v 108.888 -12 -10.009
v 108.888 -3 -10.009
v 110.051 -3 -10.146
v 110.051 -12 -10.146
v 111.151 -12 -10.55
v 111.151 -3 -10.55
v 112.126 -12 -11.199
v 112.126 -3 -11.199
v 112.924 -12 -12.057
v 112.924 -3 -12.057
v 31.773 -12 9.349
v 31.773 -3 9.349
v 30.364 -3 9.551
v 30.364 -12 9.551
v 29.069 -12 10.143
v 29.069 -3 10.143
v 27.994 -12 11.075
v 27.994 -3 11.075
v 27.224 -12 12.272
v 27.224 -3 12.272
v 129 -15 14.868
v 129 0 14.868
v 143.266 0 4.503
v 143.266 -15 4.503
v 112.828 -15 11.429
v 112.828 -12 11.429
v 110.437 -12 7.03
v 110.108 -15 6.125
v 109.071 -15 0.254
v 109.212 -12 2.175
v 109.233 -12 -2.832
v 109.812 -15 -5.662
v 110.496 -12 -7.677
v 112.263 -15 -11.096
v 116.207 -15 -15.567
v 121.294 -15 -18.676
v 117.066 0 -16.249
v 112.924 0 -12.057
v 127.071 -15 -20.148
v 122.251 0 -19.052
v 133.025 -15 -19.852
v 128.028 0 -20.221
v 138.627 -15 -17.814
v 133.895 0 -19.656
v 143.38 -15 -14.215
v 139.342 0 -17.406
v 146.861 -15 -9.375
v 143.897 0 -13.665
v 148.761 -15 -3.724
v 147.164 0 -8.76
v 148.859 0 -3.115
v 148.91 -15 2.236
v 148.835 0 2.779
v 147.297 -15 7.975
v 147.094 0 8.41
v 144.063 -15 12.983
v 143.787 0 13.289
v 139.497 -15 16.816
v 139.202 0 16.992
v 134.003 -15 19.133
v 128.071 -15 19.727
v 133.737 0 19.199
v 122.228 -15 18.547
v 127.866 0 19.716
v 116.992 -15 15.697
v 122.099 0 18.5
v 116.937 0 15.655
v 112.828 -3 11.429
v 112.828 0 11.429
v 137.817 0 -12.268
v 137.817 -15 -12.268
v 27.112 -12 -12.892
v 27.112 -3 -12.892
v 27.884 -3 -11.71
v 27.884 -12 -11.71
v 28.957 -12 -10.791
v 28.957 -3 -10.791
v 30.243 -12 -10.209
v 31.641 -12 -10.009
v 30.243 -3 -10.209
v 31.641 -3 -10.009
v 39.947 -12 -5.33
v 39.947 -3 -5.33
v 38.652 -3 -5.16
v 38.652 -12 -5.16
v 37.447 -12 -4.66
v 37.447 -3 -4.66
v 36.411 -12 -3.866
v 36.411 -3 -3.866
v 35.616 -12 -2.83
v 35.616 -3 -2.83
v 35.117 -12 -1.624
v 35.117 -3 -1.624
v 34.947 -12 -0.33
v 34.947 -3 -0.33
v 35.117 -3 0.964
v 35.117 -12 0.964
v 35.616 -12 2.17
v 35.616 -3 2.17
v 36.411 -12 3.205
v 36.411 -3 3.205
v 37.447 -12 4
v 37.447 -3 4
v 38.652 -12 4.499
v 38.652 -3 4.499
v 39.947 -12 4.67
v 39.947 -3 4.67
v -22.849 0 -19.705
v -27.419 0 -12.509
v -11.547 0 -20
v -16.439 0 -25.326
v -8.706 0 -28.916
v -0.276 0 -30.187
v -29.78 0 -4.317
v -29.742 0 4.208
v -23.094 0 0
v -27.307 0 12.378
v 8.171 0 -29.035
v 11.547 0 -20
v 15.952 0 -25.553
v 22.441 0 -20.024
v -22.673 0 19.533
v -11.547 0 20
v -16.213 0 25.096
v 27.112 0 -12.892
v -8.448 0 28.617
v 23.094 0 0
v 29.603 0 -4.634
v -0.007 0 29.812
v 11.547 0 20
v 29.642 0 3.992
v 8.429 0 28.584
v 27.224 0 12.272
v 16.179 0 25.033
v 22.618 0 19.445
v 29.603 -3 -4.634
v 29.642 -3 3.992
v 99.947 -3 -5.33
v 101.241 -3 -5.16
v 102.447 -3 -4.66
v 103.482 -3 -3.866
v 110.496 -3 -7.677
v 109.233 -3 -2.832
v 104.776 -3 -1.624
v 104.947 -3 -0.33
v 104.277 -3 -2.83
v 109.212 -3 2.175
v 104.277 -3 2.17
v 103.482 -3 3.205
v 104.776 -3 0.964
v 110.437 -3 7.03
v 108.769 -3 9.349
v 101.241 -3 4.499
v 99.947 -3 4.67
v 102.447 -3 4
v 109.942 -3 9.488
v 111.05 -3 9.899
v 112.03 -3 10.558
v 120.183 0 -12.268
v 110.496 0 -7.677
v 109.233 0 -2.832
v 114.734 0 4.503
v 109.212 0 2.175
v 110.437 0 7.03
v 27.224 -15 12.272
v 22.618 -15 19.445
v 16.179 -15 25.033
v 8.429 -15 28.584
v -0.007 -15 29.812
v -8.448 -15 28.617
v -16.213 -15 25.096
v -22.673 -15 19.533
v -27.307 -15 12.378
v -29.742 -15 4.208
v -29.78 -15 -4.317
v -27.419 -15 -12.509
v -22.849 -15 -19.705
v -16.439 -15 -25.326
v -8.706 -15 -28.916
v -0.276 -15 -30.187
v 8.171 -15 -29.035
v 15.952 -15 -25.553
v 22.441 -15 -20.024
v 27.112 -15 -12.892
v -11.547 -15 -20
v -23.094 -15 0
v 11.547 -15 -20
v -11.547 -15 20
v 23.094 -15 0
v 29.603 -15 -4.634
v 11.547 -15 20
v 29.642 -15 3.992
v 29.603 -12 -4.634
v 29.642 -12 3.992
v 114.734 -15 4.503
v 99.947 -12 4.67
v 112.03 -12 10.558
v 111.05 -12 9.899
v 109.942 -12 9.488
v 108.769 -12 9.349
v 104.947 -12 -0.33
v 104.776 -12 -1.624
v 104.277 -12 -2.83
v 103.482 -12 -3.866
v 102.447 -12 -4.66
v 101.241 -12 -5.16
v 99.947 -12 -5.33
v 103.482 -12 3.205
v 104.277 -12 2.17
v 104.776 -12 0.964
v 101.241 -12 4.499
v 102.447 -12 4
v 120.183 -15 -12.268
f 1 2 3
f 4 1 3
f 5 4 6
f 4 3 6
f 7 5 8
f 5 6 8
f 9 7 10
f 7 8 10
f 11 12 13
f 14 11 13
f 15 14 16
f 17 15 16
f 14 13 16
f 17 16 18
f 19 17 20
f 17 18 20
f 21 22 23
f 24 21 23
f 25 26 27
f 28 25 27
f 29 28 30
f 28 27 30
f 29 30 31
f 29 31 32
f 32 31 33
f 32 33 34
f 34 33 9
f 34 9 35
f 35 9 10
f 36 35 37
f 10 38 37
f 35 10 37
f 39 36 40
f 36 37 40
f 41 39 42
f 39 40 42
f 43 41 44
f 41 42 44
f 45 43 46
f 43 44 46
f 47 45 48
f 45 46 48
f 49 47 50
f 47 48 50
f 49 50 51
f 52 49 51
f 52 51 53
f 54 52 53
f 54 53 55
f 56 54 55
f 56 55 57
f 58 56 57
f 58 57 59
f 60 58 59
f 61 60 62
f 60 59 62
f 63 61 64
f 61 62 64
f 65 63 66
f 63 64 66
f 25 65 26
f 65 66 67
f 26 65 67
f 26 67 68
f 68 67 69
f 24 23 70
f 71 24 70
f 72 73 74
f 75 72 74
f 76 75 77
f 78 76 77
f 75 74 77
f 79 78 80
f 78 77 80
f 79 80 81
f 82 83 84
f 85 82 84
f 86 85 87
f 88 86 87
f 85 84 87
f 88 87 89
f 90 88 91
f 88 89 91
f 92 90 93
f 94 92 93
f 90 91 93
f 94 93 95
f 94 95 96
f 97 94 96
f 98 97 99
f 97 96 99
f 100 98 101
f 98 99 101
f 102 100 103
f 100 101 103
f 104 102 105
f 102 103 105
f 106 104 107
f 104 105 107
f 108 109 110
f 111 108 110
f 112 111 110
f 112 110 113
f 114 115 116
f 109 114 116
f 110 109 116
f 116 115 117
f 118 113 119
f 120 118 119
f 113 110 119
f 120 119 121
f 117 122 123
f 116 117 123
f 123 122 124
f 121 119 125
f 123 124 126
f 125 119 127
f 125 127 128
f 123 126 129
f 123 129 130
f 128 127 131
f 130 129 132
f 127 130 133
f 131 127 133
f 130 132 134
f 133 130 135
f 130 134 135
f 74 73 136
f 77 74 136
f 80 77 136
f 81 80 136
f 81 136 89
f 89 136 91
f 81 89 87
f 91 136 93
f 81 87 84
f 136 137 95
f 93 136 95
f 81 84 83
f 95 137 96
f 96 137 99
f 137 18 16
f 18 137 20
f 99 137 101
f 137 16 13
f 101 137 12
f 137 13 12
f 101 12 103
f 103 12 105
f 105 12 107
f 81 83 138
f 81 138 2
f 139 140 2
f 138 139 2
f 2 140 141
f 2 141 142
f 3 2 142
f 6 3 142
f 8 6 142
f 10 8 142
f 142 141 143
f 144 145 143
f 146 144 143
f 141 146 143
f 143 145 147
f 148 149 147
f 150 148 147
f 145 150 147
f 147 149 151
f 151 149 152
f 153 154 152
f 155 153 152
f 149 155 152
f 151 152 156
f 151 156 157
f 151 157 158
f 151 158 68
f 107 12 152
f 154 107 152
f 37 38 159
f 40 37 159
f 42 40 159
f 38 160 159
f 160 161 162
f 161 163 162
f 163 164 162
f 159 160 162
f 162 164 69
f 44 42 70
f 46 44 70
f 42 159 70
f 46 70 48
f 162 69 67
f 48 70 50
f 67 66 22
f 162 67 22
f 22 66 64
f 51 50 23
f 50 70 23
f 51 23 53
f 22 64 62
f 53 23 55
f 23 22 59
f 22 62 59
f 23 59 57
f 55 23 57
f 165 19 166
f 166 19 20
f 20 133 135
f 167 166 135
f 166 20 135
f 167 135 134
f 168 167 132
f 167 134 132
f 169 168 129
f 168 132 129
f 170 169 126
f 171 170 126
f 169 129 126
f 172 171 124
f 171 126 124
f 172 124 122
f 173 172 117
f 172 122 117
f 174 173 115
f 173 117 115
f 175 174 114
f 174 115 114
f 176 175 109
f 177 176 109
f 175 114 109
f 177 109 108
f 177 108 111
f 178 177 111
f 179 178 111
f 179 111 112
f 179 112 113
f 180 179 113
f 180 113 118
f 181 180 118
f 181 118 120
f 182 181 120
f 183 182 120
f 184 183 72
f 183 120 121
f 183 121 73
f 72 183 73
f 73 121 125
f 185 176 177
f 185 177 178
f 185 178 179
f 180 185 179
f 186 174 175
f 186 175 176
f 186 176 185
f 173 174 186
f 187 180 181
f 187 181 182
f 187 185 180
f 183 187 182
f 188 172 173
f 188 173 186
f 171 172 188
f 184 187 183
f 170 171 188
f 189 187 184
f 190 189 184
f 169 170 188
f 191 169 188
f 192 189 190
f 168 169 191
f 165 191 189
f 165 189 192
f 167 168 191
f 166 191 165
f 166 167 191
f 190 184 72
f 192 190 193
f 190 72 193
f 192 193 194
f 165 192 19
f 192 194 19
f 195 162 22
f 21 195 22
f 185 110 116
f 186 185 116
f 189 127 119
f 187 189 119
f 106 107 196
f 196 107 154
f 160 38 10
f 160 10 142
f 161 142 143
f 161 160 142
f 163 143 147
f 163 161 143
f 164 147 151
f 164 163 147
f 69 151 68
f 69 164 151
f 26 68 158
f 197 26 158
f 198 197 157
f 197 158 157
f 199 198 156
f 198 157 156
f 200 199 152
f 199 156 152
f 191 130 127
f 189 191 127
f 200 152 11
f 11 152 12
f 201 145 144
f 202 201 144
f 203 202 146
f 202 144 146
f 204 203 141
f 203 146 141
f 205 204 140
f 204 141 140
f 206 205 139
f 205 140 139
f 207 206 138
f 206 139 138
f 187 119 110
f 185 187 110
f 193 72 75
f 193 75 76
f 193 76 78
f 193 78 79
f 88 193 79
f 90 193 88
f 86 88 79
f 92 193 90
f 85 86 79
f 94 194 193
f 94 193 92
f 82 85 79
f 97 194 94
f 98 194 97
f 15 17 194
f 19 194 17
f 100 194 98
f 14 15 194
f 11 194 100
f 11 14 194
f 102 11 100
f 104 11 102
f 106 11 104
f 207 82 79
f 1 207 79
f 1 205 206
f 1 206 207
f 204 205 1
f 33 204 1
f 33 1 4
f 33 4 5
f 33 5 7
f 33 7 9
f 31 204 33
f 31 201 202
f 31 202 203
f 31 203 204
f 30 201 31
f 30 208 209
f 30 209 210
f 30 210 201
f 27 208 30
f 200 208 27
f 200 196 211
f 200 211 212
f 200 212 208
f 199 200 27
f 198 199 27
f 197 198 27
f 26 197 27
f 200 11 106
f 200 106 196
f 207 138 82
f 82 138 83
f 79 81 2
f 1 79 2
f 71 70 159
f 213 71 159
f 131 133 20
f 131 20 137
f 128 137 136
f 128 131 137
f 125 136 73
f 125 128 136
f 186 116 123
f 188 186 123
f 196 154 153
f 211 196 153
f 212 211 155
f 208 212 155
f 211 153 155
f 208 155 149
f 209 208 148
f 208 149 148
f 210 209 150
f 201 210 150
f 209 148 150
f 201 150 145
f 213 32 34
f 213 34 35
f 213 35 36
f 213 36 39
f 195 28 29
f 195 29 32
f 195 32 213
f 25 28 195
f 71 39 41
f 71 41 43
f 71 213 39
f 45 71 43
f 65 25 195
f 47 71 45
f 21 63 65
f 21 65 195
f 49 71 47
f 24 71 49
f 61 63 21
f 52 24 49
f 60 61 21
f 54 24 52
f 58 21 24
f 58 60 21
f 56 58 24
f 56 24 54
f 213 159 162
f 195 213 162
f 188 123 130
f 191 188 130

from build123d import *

# Parameters (mm, degrees)
F1_DEPTH = 15
F2_DEPTH = 12
F3_DEPTH = 3


with BuildPart() as f1:
    # F0 (on Front) → F1 (new body)
    with BuildSketch(Plane.XZ):
        with BuildLine():
            ThreePointArc((27.111572217, -12.8918176383), (29.93394524, -0.3222598375), (27.2243880974, 12.2720989346))
            ThreePointArc((27.2243880974, 12.2720989346), (-30.0654517858, -0.0532681334), (27.111572217, -12.8918176383))
        make_face()
        Polygon((-11.5470053838, -20), (-23.0940107676, 0), (-11.5470053838, 20), (11.5470053838, 20), (23.0940107676, 0), (11.5470053838, -20), align=None, mode=Mode.SUBTRACT)
    extrude(amount=F1_DEPTH)



with BuildPart() as f1b:
    # F0 (on Front) → F1, piece 2 (new body)
    with BuildSketch(Plane.XZ):
        with BuildLine():
            ThreePointArc((112.9235786366, -12.0569396696), (149.0649853319, -0.1668697578), (112.8282363773, 11.4293824652))
            ThreePointArc((112.8282363773, 11.4293824652), (109.0653149154, -0.3292476273), (112.9235786366, -12.0569396696))
        make_face()
        Polygon((114.7340843825, 4.5029248509), (128.9999321269, 14.8676699353), (143.2657798714, 4.5029248509), (137.8167109113, -12.2675849804), (120.1831533425, -12.2675849804), align=None, mode=Mode.SUBTRACT)
    extrude(amount=F1_DEPTH)


with BuildPart() as f1_1:
    add(f1.part)

    add(f1b.part)  # F2 merges F1b
    # F0 (on Front) → F2 (join)
    with BuildSketch(Plane.XZ):
        with BuildLine():
            Line((108.7690079407, 9.3487427546), (31.7727449925, 9.3487427546))
            ThreePointArc((31.7727449925, 9.3487427546), (29.0693414988, 10.1426032479), (27.2243880974, 12.2720989346))
            ThreePointArc((27.2243880974, 12.2720989346), (29.93394524, -0.3222598375), (27.111572217, -12.8918176383))
            ThreePointArc((27.111572217, -12.8918176383), (28.9566070835, -10.7909427918), (31.6411264653, -10.0091599138))
            Line((31.6411264653, -10.0091599138), (108.8881857649, -10.0091599138))
            ThreePointArc((108.8881857649, -10.0091599138), (111.1508057925, -10.5503988067), (112.9235786366, -12.0569396696))
            ThreePointArc((112.9235786366, -12.0569396696), (109.0653149154, -0.3292476273), (112.8282363773, 11.4293824652))
            ThreePointArc((112.8282363773, 11.4293824652), (111.0497094285, 9.8992033713), (108.7690079407, 9.3487427546))
        make_face()
        with BuildLine():
            ThreePointArc((34.9465236354, -0.3302085796), (36.4109897295, 3.2053253263), (39.9465236354, 4.6697914204))
            Line((39.9465236354, 4.6697914204), (99.9465236354, 4.6697914204))
            ThreePointArc((99.9465236354, 4.6697914204), (103.4820575413, 3.2053253263), (104.9465236354, -0.3302085796))
            ThreePointArc((104.9465236354, -0.3302085796), (103.4820575413, -3.8657424855), (99.9465236354, -5.3302085796))
            Line((99.9465236354, -5.3302085796), (39.9465236354, -5.3302085796))
            ThreePointArc((39.9465236354, -5.3302085796), (36.4109897295, -3.8657424855), (34.9465236354, -0.3302085796))
        make_face(mode=Mode.SUBTRACT)
    extrude(amount=F2_DEPTH)

    # F0 (on Front) → F3 (cut)
    with BuildSketch(Plane.XZ):
        with BuildLine():
            Line((108.7690079407, 9.3487427546), (31.7727449925, 9.3487427546))
            ThreePointArc((31.7727449925, 9.3487427546), (29.0693414988, 10.1426032479), (27.2243880974, 12.2720989346))
            ThreePointArc((27.2243880974, 12.2720989346), (29.93394524, -0.3222598375), (27.111572217, -12.8918176383))
            ThreePointArc((27.111572217, -12.8918176383), (28.9566070835, -10.7909427918), (31.6411264653, -10.0091599138))
            Line((31.6411264653, -10.0091599138), (108.8881857649, -10.0091599138))
            ThreePointArc((108.8881857649, -10.0091599138), (111.1508057925, -10.5503988067), (112.9235786366, -12.0569396696))
            ThreePointArc((112.9235786366, -12.0569396696), (109.0653149154, -0.3292476273), (112.8282363773, 11.4293824652))
            ThreePointArc((112.8282363773, 11.4293824652), (111.0497094285, 9.8992033713), (108.7690079407, 9.3487427546))
        make_face()
        with BuildLine():
            ThreePointArc((34.9465236354, -0.3302085796), (36.4109897295, 3.2053253263), (39.9465236354, 4.6697914204))
            Line((39.9465236354, 4.6697914204), (99.9465236354, 4.6697914204))
            ThreePointArc((99.9465236354, 4.6697914204), (103.4820575413, 3.2053253263), (104.9465236354, -0.3302085796))
            ThreePointArc((104.9465236354, -0.3302085796), (103.4820575413, -3.8657424855), (99.9465236354, -5.3302085796))
            Line((99.9465236354, -5.3302085796), (39.9465236354, -5.3302085796))
            ThreePointArc((39.9465236354, -5.3302085796), (36.4109897295, -3.8657424855), (34.9465236354, -0.3302085796))
        make_face(mode=Mode.SUBTRACT)
    extrude(amount=F3_DEPTH, mode=Mode.SUBTRACT)


solid = f1_1.part
